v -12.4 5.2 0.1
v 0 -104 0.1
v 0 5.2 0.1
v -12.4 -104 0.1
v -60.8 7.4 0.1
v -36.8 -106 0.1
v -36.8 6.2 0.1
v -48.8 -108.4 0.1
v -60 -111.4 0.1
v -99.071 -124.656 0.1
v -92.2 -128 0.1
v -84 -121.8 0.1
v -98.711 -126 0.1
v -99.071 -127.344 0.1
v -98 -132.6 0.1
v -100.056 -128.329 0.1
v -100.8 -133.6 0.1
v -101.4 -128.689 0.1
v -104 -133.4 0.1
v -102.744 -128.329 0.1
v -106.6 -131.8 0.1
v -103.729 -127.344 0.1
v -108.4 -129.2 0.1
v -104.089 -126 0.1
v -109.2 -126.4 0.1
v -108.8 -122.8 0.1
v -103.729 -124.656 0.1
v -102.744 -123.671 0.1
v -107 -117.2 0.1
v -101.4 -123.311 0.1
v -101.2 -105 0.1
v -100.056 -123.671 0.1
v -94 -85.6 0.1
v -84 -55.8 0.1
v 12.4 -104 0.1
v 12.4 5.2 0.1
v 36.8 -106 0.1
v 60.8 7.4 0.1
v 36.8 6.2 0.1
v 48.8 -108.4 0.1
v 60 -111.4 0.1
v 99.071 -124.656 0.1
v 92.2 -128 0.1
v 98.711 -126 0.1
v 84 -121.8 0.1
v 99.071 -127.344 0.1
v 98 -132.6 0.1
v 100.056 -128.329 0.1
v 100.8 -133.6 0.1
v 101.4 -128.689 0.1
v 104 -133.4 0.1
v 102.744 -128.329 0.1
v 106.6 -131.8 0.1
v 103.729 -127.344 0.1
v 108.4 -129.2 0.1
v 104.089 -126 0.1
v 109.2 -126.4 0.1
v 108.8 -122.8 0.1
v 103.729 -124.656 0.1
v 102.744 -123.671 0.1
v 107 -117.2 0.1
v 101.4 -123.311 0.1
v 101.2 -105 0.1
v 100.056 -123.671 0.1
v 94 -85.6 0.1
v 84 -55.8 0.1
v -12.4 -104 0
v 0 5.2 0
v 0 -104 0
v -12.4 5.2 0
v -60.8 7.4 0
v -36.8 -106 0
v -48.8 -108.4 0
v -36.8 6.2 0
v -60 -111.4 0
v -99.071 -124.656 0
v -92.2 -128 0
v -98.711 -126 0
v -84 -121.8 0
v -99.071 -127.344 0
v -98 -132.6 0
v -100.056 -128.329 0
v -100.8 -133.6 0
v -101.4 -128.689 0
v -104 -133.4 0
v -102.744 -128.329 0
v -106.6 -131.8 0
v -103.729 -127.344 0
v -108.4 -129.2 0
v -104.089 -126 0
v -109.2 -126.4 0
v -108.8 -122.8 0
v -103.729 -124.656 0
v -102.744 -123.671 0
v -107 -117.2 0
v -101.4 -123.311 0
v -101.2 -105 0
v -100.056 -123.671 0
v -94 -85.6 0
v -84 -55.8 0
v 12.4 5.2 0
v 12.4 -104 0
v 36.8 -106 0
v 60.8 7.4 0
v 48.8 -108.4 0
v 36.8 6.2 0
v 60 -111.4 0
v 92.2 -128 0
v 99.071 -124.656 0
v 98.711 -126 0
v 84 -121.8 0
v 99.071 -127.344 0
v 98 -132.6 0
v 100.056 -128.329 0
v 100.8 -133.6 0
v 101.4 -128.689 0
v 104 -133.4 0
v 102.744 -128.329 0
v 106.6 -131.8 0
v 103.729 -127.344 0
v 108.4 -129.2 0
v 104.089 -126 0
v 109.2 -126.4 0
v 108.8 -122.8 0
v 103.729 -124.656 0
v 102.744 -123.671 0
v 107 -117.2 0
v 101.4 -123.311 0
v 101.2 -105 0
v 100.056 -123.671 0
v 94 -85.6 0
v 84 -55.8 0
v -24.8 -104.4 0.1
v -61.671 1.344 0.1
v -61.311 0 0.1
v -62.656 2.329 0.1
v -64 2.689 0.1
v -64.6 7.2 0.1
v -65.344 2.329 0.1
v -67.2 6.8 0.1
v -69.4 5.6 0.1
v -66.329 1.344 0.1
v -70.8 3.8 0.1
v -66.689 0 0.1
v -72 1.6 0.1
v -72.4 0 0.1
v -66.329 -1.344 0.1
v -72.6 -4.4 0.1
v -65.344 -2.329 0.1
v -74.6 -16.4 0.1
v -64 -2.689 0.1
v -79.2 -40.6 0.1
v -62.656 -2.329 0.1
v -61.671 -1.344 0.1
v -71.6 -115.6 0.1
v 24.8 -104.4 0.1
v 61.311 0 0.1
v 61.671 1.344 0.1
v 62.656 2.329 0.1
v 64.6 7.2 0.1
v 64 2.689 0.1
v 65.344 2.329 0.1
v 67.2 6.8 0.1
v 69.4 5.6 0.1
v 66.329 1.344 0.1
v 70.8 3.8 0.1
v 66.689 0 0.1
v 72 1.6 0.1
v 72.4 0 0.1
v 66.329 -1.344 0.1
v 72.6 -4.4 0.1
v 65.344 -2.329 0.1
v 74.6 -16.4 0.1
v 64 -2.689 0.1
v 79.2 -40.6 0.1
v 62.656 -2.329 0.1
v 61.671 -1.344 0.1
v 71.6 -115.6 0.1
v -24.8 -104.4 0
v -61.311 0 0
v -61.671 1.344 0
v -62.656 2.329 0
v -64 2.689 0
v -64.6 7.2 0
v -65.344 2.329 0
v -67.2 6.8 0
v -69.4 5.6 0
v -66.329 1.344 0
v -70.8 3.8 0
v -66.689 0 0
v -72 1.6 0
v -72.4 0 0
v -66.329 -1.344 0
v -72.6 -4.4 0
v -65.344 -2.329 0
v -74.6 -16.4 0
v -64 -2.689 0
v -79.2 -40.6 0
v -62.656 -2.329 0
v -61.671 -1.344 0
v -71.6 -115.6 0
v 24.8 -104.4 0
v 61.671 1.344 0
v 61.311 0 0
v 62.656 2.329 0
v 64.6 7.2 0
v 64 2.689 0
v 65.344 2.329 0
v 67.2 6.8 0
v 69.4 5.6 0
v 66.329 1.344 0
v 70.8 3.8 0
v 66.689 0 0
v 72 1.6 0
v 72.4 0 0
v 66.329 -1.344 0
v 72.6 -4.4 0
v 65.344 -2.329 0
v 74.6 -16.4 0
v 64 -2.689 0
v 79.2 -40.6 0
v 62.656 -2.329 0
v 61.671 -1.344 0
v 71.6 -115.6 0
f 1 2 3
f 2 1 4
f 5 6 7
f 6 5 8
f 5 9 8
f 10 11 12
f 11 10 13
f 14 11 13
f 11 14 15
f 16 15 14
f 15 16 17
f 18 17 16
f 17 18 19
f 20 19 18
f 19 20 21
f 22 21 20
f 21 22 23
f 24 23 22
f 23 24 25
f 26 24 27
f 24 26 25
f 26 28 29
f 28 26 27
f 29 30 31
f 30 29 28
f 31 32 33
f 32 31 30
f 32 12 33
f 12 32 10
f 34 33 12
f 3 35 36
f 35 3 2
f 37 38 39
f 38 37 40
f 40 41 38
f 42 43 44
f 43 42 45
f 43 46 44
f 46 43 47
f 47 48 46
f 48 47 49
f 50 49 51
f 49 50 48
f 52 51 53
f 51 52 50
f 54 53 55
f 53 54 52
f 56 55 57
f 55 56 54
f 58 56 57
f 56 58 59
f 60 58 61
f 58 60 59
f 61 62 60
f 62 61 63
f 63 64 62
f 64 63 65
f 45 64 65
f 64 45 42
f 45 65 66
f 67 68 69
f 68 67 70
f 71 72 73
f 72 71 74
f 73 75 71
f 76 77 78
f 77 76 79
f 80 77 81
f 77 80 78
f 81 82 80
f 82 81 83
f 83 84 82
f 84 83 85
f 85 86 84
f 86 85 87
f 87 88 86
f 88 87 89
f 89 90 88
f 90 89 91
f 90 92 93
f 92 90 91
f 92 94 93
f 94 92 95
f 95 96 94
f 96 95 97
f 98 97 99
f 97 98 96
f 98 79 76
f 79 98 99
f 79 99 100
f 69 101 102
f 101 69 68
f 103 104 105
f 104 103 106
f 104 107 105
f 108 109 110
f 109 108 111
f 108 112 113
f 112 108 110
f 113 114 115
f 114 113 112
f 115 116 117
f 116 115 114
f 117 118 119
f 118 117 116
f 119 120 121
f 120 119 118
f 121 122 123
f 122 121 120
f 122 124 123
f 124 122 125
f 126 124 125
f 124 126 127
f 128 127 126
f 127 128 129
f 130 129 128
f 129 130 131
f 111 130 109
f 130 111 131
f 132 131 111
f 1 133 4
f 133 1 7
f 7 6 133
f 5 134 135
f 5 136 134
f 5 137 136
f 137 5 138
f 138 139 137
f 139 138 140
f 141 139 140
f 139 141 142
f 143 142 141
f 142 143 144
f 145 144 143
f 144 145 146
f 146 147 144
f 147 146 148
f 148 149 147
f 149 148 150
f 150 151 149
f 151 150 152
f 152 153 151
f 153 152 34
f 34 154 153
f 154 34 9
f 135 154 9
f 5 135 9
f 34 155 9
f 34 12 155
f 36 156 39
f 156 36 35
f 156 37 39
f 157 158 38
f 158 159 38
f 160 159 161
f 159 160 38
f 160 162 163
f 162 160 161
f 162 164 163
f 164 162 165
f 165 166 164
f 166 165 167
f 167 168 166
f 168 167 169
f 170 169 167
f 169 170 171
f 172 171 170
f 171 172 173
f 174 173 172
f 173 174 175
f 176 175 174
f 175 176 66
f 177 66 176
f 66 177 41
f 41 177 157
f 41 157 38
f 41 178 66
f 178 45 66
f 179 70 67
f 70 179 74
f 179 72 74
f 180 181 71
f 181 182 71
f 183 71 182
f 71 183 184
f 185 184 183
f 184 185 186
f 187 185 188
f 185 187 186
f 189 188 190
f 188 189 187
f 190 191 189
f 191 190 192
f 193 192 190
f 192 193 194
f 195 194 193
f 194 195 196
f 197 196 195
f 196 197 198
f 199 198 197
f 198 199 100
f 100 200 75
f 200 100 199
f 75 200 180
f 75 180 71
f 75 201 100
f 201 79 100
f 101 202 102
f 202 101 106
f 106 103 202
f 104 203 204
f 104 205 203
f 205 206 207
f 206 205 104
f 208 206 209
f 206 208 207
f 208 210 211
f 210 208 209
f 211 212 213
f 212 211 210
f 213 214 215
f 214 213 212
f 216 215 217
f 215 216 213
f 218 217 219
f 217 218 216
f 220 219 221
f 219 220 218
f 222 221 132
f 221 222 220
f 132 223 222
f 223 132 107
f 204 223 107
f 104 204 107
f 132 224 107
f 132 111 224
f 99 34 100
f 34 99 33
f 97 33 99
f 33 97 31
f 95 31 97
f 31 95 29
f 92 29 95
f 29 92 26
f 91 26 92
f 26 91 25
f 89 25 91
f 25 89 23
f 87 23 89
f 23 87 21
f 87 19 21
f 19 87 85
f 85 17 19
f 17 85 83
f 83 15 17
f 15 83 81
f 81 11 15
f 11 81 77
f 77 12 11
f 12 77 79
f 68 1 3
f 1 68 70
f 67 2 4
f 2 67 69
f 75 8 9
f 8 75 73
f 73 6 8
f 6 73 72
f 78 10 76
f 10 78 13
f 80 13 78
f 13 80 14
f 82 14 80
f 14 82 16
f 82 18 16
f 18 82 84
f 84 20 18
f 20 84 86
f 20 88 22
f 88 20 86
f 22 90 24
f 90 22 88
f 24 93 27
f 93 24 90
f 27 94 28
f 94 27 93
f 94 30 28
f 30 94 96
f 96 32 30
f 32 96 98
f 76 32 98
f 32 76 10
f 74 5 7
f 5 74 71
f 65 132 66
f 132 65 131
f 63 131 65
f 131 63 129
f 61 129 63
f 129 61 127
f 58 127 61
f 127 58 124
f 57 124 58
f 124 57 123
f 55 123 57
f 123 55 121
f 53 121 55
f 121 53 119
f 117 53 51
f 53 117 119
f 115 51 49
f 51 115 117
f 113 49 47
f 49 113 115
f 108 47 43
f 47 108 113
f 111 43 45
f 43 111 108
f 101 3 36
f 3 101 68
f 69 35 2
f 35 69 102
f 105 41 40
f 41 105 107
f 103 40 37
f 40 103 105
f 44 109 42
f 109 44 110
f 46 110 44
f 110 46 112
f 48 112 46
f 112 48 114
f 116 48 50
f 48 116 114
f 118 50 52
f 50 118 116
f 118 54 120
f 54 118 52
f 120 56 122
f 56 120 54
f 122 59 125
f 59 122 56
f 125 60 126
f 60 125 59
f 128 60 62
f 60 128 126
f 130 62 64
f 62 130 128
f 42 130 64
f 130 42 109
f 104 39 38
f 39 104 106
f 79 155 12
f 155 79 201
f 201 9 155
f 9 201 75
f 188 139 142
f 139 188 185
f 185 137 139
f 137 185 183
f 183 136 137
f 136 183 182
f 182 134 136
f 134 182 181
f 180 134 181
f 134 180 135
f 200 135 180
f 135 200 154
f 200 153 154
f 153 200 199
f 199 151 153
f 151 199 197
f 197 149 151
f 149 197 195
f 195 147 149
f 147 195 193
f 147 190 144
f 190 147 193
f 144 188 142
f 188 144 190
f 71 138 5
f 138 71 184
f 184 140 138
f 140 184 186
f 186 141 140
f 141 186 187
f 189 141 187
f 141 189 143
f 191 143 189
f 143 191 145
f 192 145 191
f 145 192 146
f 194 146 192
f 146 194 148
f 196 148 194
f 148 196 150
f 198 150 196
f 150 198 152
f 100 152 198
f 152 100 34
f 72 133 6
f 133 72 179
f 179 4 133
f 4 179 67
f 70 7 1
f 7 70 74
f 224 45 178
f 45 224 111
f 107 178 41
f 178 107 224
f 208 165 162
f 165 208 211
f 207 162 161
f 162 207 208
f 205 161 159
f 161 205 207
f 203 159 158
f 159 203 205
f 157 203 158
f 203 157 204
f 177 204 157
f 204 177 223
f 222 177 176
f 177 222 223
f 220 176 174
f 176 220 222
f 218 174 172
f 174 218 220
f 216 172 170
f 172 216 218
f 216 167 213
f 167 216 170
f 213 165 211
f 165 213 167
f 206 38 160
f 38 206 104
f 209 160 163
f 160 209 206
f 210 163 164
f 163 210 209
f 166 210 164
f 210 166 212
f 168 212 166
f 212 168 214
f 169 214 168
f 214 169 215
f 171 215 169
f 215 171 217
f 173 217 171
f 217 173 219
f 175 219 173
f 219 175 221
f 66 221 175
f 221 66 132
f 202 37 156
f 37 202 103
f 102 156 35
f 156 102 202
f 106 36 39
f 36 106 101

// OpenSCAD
// file: ../p/rect2p.scad
use <../lib.scad>
function ldraw_lib__rect2p() = [
// 0 Rectangle with 2 Parallel Edges
// 0 Name: rect2p.dat
// 0 Author: Donald Sutter [technog]
// 0 !LDRAW_ORG Primitive UPDATE 2010-01
// 0 !LICENSE Licensed under CC BY 4.0 : see CAreadme.txt
// 
// 0 BFC CERTIFY CCW
  [0,"BFC","CERTIFY"],
  [0,"BFC","CCW"],
// 
// 0 !HISTORY 2003-08-01 [PTadmin] Official Update 2003-02
// 0 !HISTORY 2007-06-24 [PTadmin] Header formatted for Contributor Agreement
// 0 !HISTORY 2008-07-01 [PTadmin] Official Update 2008-01
// 0 !HISTORY 2010-01-17 [mikeheide] changed winding to CCW
// 0 !HISTORY 2010-04-05 [PTadmin] Official Update 2010-01
// 
// 
// 2 24 1 0 1 -1 0 1
  [2,24,1,0,1,-1,0,1],
// 2 24 -1 0 -1 1 0 -1
  [2,24,-1,0,-1,1,0,-1],
// 4 16 -1 0 1 -1 0 -1 1 0 -1 1 0 1
  [4,16,-1,0,1,-1,0,-1,1,0,-1,1,0,1],
// 0
];
module ldraw_lib__rect2p(step=0, col=false, unit=2/5, alt=false, line=0.2, solid=!$preview)
    makepoly(ldraw_lib__rect2p(), step=step, col=col, unit=unit, alt=alt, line=line, solid=solid);
ldraw_lib__rect2p(line=0.2);
// file: s/u9494s04.scad
use <../../lib.scad>
function ldraw_lib__s__u9494s04() = [
// 0 ~Sail 27 x 17 Trapezoidal Edge Stripe 2
// 0 Name: s\u9494s04.dat
// 0 Author: Philippe Hurbain [Philo]
// 0 !LDRAW_ORG Subpart UPDATE 2020-03
// 0 !LICENSE Licensed under CC BY 4.0 : see CAreadme.txt
// 
// 0 BFC CERTIFY CCW
  [0,"BFC","CERTIFY"],
  [0,"BFC","CCW"],
// 
// 0 !HISTORY 2020-12-29 [PTadmin] Official Update 2020-03
// 
// 
// 4 16 -210 0 -304.5 -179 0 -289 -179 -0.25 -289 -210 -0.25 -304.5
  [4,16,-210,0,-304.5,-179,0,-289,-179,-0.25,-289,-210,-0.25,-304.5],
// 4 16 -179 0 -289 -150 0 -278.5 -150 -0.25 -278.5 -179 -0.25 -289
  [4,16,-179,0,-289,-150,0,-278.5,-150,-0.25,-278.5,-179,-0.25,-289],
// 4 16 -165.8214 0 3.361 -163.361 0 5.8214 -163.361 -0.25 5.8214 -165.8214 -0.25 3.361
  [4,16,-165.8214,0,3.361,-163.361,0,5.8214,-163.361,-0.25,5.8214,-165.8214,-0.25,3.361],
// 4 16 -163.361 0 5.8214 -160 0 6.722 -160 -0.25 6.722 -163.361 -0.25 5.8214
  [4,16,-163.361,0,5.8214,-160,0,6.722,-160,-0.25,6.722,-163.361,-0.25,5.8214],
// 4 16 -160 0 6.722 -156.639 0 5.8214 -156.639 -0.25 5.8214 -160 -0.25 6.722
  [4,16,-160,0,6.722,-156.639,0,5.8214,-156.639,-0.25,5.8214,-160,-0.25,6.722],
// 4 16 -156.639 0 5.8214 -154.1786 0 3.361 -154.1786 -0.25 3.361 -156.639 -0.25 5.8214
  [4,16,-156.639,0,5.8214,-154.1786,0,3.361,-154.1786,-0.25,3.361,-156.639,-0.25,5.8214],
// 4 16 -154.1786 0 3.361 -153.278 0 0 -153.278 -0.25 0 -154.1786 -0.25 3.361
  [4,16,-154.1786,0,3.361,-153.278,0,0,-153.278,-0.25,0,-154.1786,-0.25,3.361],
// 4 16 -153.278 0 0 -154.1786 0 -3.361 -154.1786 -0.25 -3.361 -153.278 -0.25 0
  [4,16,-153.278,0,0,-154.1786,0,-3.361,-154.1786,-0.25,-3.361,-153.278,-0.25,0],
// 4 16 -154.1786 0 -3.361 -156.639 0 -5.8214 -156.639 -0.25 -5.8214 -154.1786 -0.25 -3.361
  [4,16,-154.1786,0,-3.361,-156.639,0,-5.8214,-156.639,-0.25,-5.8214,-154.1786,-0.25,-3.361],
// 4 16 -156.639 0 -5.8214 -160 0 -6.722 -160 -0.25 -6.722 -156.639 -0.25 -5.8214
  [4,16,-156.639,0,-5.8214,-160,0,-6.722,-160,-0.25,-6.722,-156.639,-0.25,-5.8214],
// 4 16 -160 0 -6.722 -163.361 0 -5.8214 -163.361 -0.25 -5.8214 -160 -0.25 -6.722
  [4,16,-160,0,-6.722,-163.361,0,-5.8214,-163.361,-0.25,-5.8214,-160,-0.25,-6.722],
// 4 16 -163.361 0 -5.8214 -165.8214 0 -3.361 -165.8214 -0.25 -3.361 -163.361 -0.25 -5.8214
  [4,16,-163.361,0,-5.8214,-165.8214,0,-3.361,-165.8214,-0.25,-3.361,-163.361,-0.25,-5.8214],
// 4 16 -165.8214 0 -3.361 -166.722 0 0 -166.722 -0.25 0 -165.8214 -0.25 -3.361
  [4,16,-165.8214,0,-3.361,-166.722,0,0,-166.722,-0.25,0,-165.8214,-0.25,-3.361],
// 4 16 -166.722 0 0 -165.8214 0 3.361 -165.8214 -0.25 3.361 -166.722 -0.25 0
  [4,16,-166.722,0,0,-165.8214,0,3.361,-165.8214,-0.25,3.361,-166.722,-0.25,0],
// 4 16 -152 0 18.5 -161.5 0 18 -161.5 -0.25 18 -152 -0.25 18.5
  [4,16,-152,0,18.5,-161.5,0,18,-161.5,-0.25,18,-152,-0.25,18.5],
// 4 16 -161.5 0 18 -168 0 17 -168 -0.25 17 -161.5 -0.25 18
  [4,16,-161.5,0,18,-168,0,17,-168,-0.25,17,-161.5,-0.25,18],
// 4 16 -168 0 17 -173.5 0 14 -173.5 -0.25 14 -168 -0.25 17
  [4,16,-168,0,17,-173.5,0,14,-173.5,-0.25,14,-168,-0.25,17],
// 4 16 -173.5 0 14 -177 0 9.5 -177 -0.25 9.5 -173.5 -0.25 14
  [4,16,-173.5,0,14,-177,0,9.5,-177,-0.25,9.5,-173.5,-0.25,14],
// 4 16 -177 0 9.5 -180 0 4 -180 -0.25 4 -177 -0.25 9.5
  [4,16,-177,0,9.5,-180,0,4,-180,-0.25,4,-177,-0.25,9.5],
// 4 16 -180 0 4 -181 0 0 -181 -0.25 0 -180 -0.25 4
  [4,16,-180,0,4,-181,0,0,-181,-0.25,0,-180,-0.25,4],
// 4 16 -181 0 0 -181.5 0 -11 -181.5 -0.25 -11 -181 -0.25 0
  [4,16,-181,0,0,-181.5,0,-11,-181.5,-0.25,-11,-181,-0.25,0],
// 4 16 -181.5 0 -11 -186.5 0 -41 -186.5 -0.25 -41 -181.5 -0.25 -11
  [4,16,-181.5,0,-11,-186.5,0,-41,-186.5,-0.25,-41,-181.5,-0.25,-11],
// 4 16 -186.5 0 -41 -198 0 -101.5 -198 -0.25 -101.5 -186.5 -0.25 -41
  [4,16,-186.5,0,-41,-198,0,-101.5,-198,-0.25,-101.5,-186.5,-0.25,-41],
// 4 16 -198 0 -101.5 -210 0 -139.5 -210 -0.25 -139.5 -198 -0.25 -101.5
  [4,16,-198,0,-101.5,-210,0,-139.5,-210,-0.25,-139.5,-198,-0.25,-101.5],
// 4 16 -92 0 -265 -62 0 -261 -62 -0.25 -261 -92 -0.25 -265
  [4,16,-92,0,-265,-62,0,-261,-62,-0.25,-261,-92,-0.25,-265],
// 4 16 -62 0 -261 -31 0 -260 -31 -0.25 -260 -62 -0.25 -261
  [4,16,-62,0,-261,-31,0,-260,-31,-0.25,-260,-62,-0.25,-261],
// 4 16 -31 0 13 -92 0 15.5 -92 -0.25 15.5 -31 -0.25 13
  [4,16,-31,0,13,-92,0,15.5,-92,-0.25,15.5,-31,-0.25,13],
// 5 24 -156.639 0 -5.8214 -156.639 -0.25 -5.8214 -160 0 -6.722 -154.1786 0 -3.361
  [5,24,-156.639,0,-5.8214,-156.639,-0.25,-5.8214,-160,0,-6.722,-154.1786,0,-3.361],
// 5 24 -160 0 -6.722 -160 -0.25 -6.722 -163.361 0 -5.8214 -156.639 0 -5.8214
  [5,24,-160,0,-6.722,-160,-0.25,-6.722,-163.361,0,-5.8214,-156.639,0,-5.8214],
// 5 24 -163.361 0 -5.8214 -163.361 -0.25 -5.8214 -165.8214 0 -3.361 -160 0 -6.722
  [5,24,-163.361,0,-5.8214,-163.361,-0.25,-5.8214,-165.8214,0,-3.361,-160,0,-6.722],
// 5 24 -165.8214 0 -3.361 -165.8214 -0.25 -3.361 -166.722 0 0 -163.361 0 -5.8214
  [5,24,-165.8214,0,-3.361,-165.8214,-0.25,-3.361,-166.722,0,0,-163.361,0,-5.8214],
// 5 24 -166.722 0 0 -166.722 -0.25 0 -165.8214 0 3.361 -165.8214 0 -3.361
  [5,24,-166.722,0,0,-166.722,-0.25,0,-165.8214,0,3.361,-165.8214,0,-3.361],
// 5 24 -165.8214 0 3.361 -165.8214 -0.25 3.361 -166.722 0 0 -163.361 0 5.8214
  [5,24,-165.8214,0,3.361,-165.8214,-0.25,3.361,-166.722,0,0,-163.361,0,5.8214],
// 5 24 -161.5 0 18 -161.5 -0.25 18 -168 0 17 -152 0 18.5
  [5,24,-161.5,0,18,-161.5,-0.25,18,-168,0,17,-152,0,18.5],
// 5 24 -168 0 17 -168 -0.25 17 -173.5 0 14 -161.5 0 18
  [5,24,-168,0,17,-168,-0.25,17,-173.5,0,14,-161.5,0,18],
// 5 24 -173.5 0 14 -173.5 -0.25 14 -177 0 9.5 -168 0 17
  [5,24,-173.5,0,14,-173.5,-0.25,14,-177,0,9.5,-168,0,17],
// 5 24 -177 0 9.5 -177 -0.25 9.5 -180 0 4 -173.5 0 14
  [5,24,-177,0,9.5,-177,-0.25,9.5,-180,0,4,-173.5,0,14],
// 5 24 -180 0 4 -180 -0.25 4 -181 0 0 -177 0 9.5
  [5,24,-180,0,4,-180,-0.25,4,-181,0,0,-177,0,9.5],
// 5 24 -181 0 0 -181 -0.25 0 -181.5 0 -11 -180 0 4
  [5,24,-181,0,0,-181,-0.25,0,-181.5,0,-11,-180,0,4],
// 5 24 -181.5 0 -11 -181.5 -0.25 -11 -186.5 0 -41 -181 0 0
  [5,24,-181.5,0,-11,-181.5,-0.25,-11,-186.5,0,-41,-181,0,0],
// 5 24 -186.5 0 -41 -186.5 -0.25 -41 -198 0 -101.5 -181.5 0 -11
  [5,24,-186.5,0,-41,-186.5,-0.25,-41,-198,0,-101.5,-181.5,0,-11],
// 5 24 -198 0 -101.5 -198 -0.25 -101.5 -210 0 -139.5 -186.5 0 -41
  [5,24,-198,0,-101.5,-198,-0.25,-101.5,-210,0,-139.5,-186.5,0,-41],
// 5 24 -62 0 -261 -62 -0.25 -261 -31 0 -260 -92 0 -265
  [5,24,-62,0,-261,-62,-0.25,-261,-31,0,-260,-92,0,-265],
// 5 24 -179 0 -289 -179 -0.25 -289 -150 0 -278.5 -210 0 -304.5
  [5,24,-179,0,-289,-179,-0.25,-289,-150,0,-278.5,-210,0,-304.5],
// 5 24 -163.361 0 5.8214 -163.361 -0.25 5.8214 -160 0 6.722 -165.8214 0 3.361
  [5,24,-163.361,0,5.8214,-163.361,-0.25,5.8214,-160,0,6.722,-165.8214,0,3.361],
// 5 24 -160 0 6.722 -160 -0.25 6.722 -156.639 0 5.8214 -163.361 0 5.8214
  [5,24,-160,0,6.722,-160,-0.25,6.722,-156.639,0,5.8214,-163.361,0,5.8214],
// 5 24 -156.639 0 5.8214 -156.639 -0.25 5.8214 -154.1786 0 3.361 -160 0 6.722
  [5,24,-156.639,0,5.8214,-156.639,-0.25,5.8214,-154.1786,0,3.361,-160,0,6.722],
// 5 24 -154.1786 0 3.361 -154.1786 -0.25 3.361 -153.278 0 0 -156.639 0 5.8214
  [5,24,-154.1786,0,3.361,-154.1786,-0.25,3.361,-153.278,0,0,-156.639,0,5.8214],
// 5 24 -153.278 0 0 -153.278 -0.25 0 -154.1786 0 -3.361 -154.1786 0 3.361
  [5,24,-153.278,0,0,-153.278,-0.25,0,-154.1786,0,-3.361,-154.1786,0,3.361],
// 5 24 -154.1786 0 -3.361 -154.1786 -0.25 -3.361 -156.639 0 -5.8214 -153.278 0 0
  [5,24,-154.1786,0,-3.361,-154.1786,-0.25,-3.361,-156.639,0,-5.8214,-153.278,0,0],
];
module ldraw_lib__s__u9494s04(step=0, col=false, unit=2/5, alt=false, line=0.2, solid=!$preview)
    makepoly(ldraw_lib__s__u9494s04(), step=step, col=col, unit=unit, alt=alt, line=line, solid=solid);
ldraw_lib__s__u9494s04(line=0.2);
// file: s/u9494s02.scad
use <../../lib.scad>
function ldraw_lib__s__u9494s02() = [
// 0 ~Sail 27 x 17 Trapezoidal Surface Stripe  2
// 0 Name: s\u9494s02.dat
// 0 Author: Philippe Hurbain [Philo]
// 0 !LDRAW_ORG Subpart UPDATE 2020-03
// 0 !LICENSE Licensed under CC BY 4.0 : see CAreadme.txt
// 
// 0 BFC CERTIFY CCW
  [0,"BFC","CERTIFY"],
  [0,"BFC","CCW"],
// 
// 0 !HISTORY 2020-12-29 [PTadmin] Official Update 2020-03
// 
// 
// 4 16 -62 0 -261 -31 0 -260 -31 0 13 -92 0 15.5
  [4,16,-62,0,-261,-31,0,-260,-31,0,13,-92,0,15.5],
// 3 16 -92 0 15.5 -92 0 -265 -62 0 -261
  [3,16,-92,0,15.5,-92,0,-265,-62,0,-261],
// 3 16 -152 0 18.5 -154.1786 0 3.361 -153.278 0 0
  [3,16,-152,0,18.5,-154.1786,0,3.361,-153.278,0,0],
// 3 16 -152 0 18.5 -156.639 0 5.8214 -154.1786 0 3.361
  [3,16,-152,0,18.5,-156.639,0,5.8214,-154.1786,0,3.361],
// 4 16 -160 0 6.722 -156.639 0 5.8214 -152 0 18.5 -161.5 0 18
  [4,16,-160,0,6.722,-156.639,0,5.8214,-152,0,18.5,-161.5,0,18],
// 4 16 -163.361 0 5.8214 -160 0 6.722 -161.5 0 18 -168 0 17
  [4,16,-163.361,0,5.8214,-160,0,6.722,-161.5,0,18,-168,0,17],
// 4 16 -163.361 0 5.8214 -168 0 17 -173.5 0 14 -165.8214 0 3.361
  [4,16,-163.361,0,5.8214,-168,0,17,-173.5,0,14,-165.8214,0,3.361],
// 4 16 -165.8214 0 3.361 -173.5 0 14 -177 0 9.5 -166.722 0 0
  [4,16,-165.8214,0,3.361,-173.5,0,14,-177,0,9.5,-166.722,0,0],
// 4 16 -166.722 0 0 -177 0 9.5 -180 0 4 -181 0 0
  [4,16,-166.722,0,0,-177,0,9.5,-180,0,4,-181,0,0],
// 4 16 -165.8214 0 -3.361 -166.722 0 0 -181 0 0 -181.5 0 -11
  [4,16,-165.8214,0,-3.361,-166.722,0,0,-181,0,0,-181.5,0,-11],
// 4 16 -163.361 0 -5.8214 -165.8214 0 -3.361 -181.5 0 -11 -186.5 0 -41
  [4,16,-163.361,0,-5.8214,-165.8214,0,-3.361,-181.5,0,-11,-186.5,0,-41],
// 4 16 -160 0 -6.722 -163.361 0 -5.8214 -186.5 0 -41 -198 0 -101.5
  [4,16,-160,0,-6.722,-163.361,0,-5.8214,-186.5,0,-41,-198,0,-101.5],
// 4 16 -156.639 0 -5.8214 -160 0 -6.722 -198 0 -101.5 -210 0 -139.5
  [4,16,-156.639,0,-5.8214,-160,0,-6.722,-198,0,-101.5,-210,0,-139.5],
// 4 16 -156.639 0 -5.8214 -210 0 -139.5 -150 0 -278.5 -154.1786 0 -3.361
  [4,16,-156.639,0,-5.8214,-210,0,-139.5,-150,0,-278.5,-154.1786,0,-3.361],
// 3 16 -153.278 0 0 -154.1786 0 -3.361 -150 0 -278.5
  [3,16,-153.278,0,0,-154.1786,0,-3.361,-150,0,-278.5],
// 3 16 -152 0 18.5 -153.278 0 0 -150 0 -278.5
  [3,16,-152,0,18.5,-153.278,0,0,-150,0,-278.5],
// 3 16 -210 0 -139.5 -179 0 -289 -150 0 -278.5
  [3,16,-210,0,-139.5,-179,0,-289,-150,0,-278.5],
// 3 16 -210 0 -139.5 -210 0 -304.5 -179 0 -289
  [3,16,-210,0,-139.5,-210,0,-304.5,-179,0,-289],
// 2 24 -210 0 -304.5 -179 0 -289
  [2,24,-210,0,-304.5,-179,0,-289],
// 2 24 -166.722 0 0 -165.8214 0 3.361
  [2,24,-166.722,0,0,-165.8214,0,3.361],
// 2 24 -168 0 17 -173.5 0 14
  [2,24,-168,0,17,-173.5,0,14],
// 2 24 -62 0 -261 -31 0 -260
  [2,24,-62,0,-261,-31,0,-260],
// 2 24 -181.5 0 -11 -186.5 0 -41
  [2,24,-181.5,0,-11,-186.5,0,-41],
// 2 24 -161.5 0 18 -168 0 17
  [2,24,-161.5,0,18,-168,0,17],
// 2 24 -152 0 18.5 -161.5 0 18
  [2,24,-152,0,18.5,-161.5,0,18],
// 2 24 -160 0 -6.722 -163.361 0 -5.8214
  [2,24,-160,0,-6.722,-163.361,0,-5.8214],
// 2 24 -163.361 0 -5.8214 -165.8214 0 -3.361
  [2,24,-163.361,0,-5.8214,-165.8214,0,-3.361],
// 2 24 -31 0 13 -92 0 15.5
  [2,24,-31,0,13,-92,0,15.5],
// 2 24 -156.639 0 -5.8214 -160 0 -6.722
  [2,24,-156.639,0,-5.8214,-160,0,-6.722],
// 2 24 -153.278 0 0 -154.1786 0 -3.361
  [2,24,-153.278,0,0,-154.1786,0,-3.361],
// 2 24 -163.361 0 5.8214 -160 0 6.722
  [2,24,-163.361,0,5.8214,-160,0,6.722],
// 2 24 -186.5 0 -41 -198 0 -101.5
  [2,24,-186.5,0,-41,-198,0,-101.5],
// 2 24 -198 0 -101.5 -210 0 -139.5
  [2,24,-198,0,-101.5,-210,0,-139.5],
// 2 24 -177 0 9.5 -180 0 4
  [2,24,-177,0,9.5,-180,0,4],
// 2 24 -165.8214 0 -3.361 -166.722 0 0
  [2,24,-165.8214,0,-3.361,-166.722,0,0],
// 2 24 -154.1786 0 -3.361 -156.639 0 -5.8214
  [2,24,-154.1786,0,-3.361,-156.639,0,-5.8214],
// 2 24 -173.5 0 14 -177 0 9.5
  [2,24,-173.5,0,14,-177,0,9.5],
// 2 24 -180 0 4 -181 0 0
  [2,24,-180,0,4,-181,0,0],
// 2 24 -181 0 0 -181.5 0 -11
  [2,24,-181,0,0,-181.5,0,-11],
// 2 24 -154.1786 0 3.361 -153.278 0 0
  [2,24,-154.1786,0,3.361,-153.278,0,0],
// 2 24 -92 0 -265 -62 0 -261
  [2,24,-92,0,-265,-62,0,-261],
// 2 24 -156.639 0 5.8214 -154.1786 0 3.361
  [2,24,-156.639,0,5.8214,-154.1786,0,3.361],
// 2 24 -160 0 6.722 -156.639 0 5.8214
  [2,24,-160,0,6.722,-156.639,0,5.8214],
// 2 24 -165.8214 0 3.361 -163.361 0 5.8214
  [2,24,-165.8214,0,3.361,-163.361,0,5.8214],
// 2 24 -179 0 -289 -150 0 -278.5
  [2,24,-179,0,-289,-150,0,-278.5],
];
module ldraw_lib__s__u9494s02(step=0, col=false, unit=2/5, alt=false, line=0.2, solid=!$preview)
    makepoly(ldraw_lib__s__u9494s02(), step=step, col=col, unit=unit, alt=alt, line=line, solid=solid);
ldraw_lib__s__u9494s02(line=0.2);
// file: s/u9494s01.scad
use <../../lib.scad>
use <../../p/rect2p.scad>
function ldraw_lib__s__u9494s01() = [
// 0 ~Sail 27 x 17 Trapezoidal Surface Stripe 1
// 0 Name: s\u9494s01.dat
// 0 Author: Philippe Hurbain [Philo]
// 0 !LDRAW_ORG Subpart UPDATE 2020-03
// 0 !LICENSE Licensed under CC BY 4.0 : see CAreadme.txt
// 
// 0 BFC CERTIFY CCW
  [0,"BFC","CERTIFY"],
  [0,"BFC","CCW"],
// 
// 0 !HISTORY 2020-12-29 [PTadmin] Official Update 2020-03
// 
// 
// 1 16 -15.5 0 -123.5 -15.5 0 0 0 1 0 0 0 -136.5 rect2p.dat
  [1,16,-15.5,0,-123.5,-15.5,0,0,0,1,0,0,0,-136.5, ldraw_lib__rect2p()],
// 4 16 -122 0 -271 -92 0 -265 -92 0 15.5 -152 0 18.5
  [4,16,-122,0,-271,-92,0,-265,-92,0,15.5,-152,0,18.5],
// 3 16 -152 0 18.5 -150 0 -278.5 -122 0 -271
  [3,16,-152,0,18.5,-150,0,-278.5,-122,0,-271],
// 4 16 -210 0 -304.5 -247.6786 0 -311.639 -246.778 0 -315 -230.5 0 -320
  [4,16,-210,0,-304.5,-247.6786,0,-311.639,-246.778,0,-315,-230.5,0,-320],
// 4 16 -230.5 0 -320 -246.778 0 -315 -247.6786 0 -318.361 -245 0 -331.5
  [4,16,-230.5,0,-320,-246.778,0,-315,-247.6786,0,-318.361,-245,0,-331.5],
// 4 16 -245 0 -331.5 -247.6786 0 -318.361 -250.139 0 -320.8214 -252 0 -334
  [4,16,-245,0,-331.5,-247.6786,0,-318.361,-250.139,0,-320.8214,-252,0,-334],
// 4 16 -252 0 -334 -250.139 0 -320.8214 -253.5 0 -321.722 -260 0 -333.5
  [4,16,-252,0,-334,-250.139,0,-320.8214,-253.5,0,-321.722,-260,0,-333.5],
// 4 16 -260 0 -333.5 -253.5 0 -321.722 -256.861 0 -320.8214 -266.5 0 -329.5
  [4,16,-260,0,-333.5,-253.5,0,-321.722,-256.861,0,-320.8214,-266.5,0,-329.5],
// 4 16 -266.5 0 -329.5 -256.861 0 -320.8214 -259.3214 0 -318.361 -271 0 -323
  [4,16,-266.5,0,-329.5,-256.861,0,-320.8214,-259.3214,0,-318.361,-271,0,-323],
// 4 16 -271 0 -323 -259.3214 0 -318.361 -260.222 0 -315 -273 0 -316
  [4,16,-271,0,-323,-259.3214,0,-318.361,-260.222,0,-315,-273,0,-316],
// 4 16 -273 0 -316 -260.222 0 -315 -259.3214 0 -311.639 -272 0 -307
  [4,16,-273,0,-316,-260.222,0,-315,-259.3214,0,-311.639,-272,0,-307],
// 4 16 -272 0 -307 -259.3214 0 -311.639 -256.861 0 -309.1786 -267.5 0 -293
  [4,16,-272,0,-307,-259.3214,0,-311.639,-256.861,0,-309.1786,-267.5,0,-293],
// 4 16 -267.5 0 -293 -256.861 0 -309.1786 -253.5 0 -308.278 -253 0 -262.5
  [4,16,-267.5,0,-293,-256.861,0,-309.1786,-253.5,0,-308.278,-253,0,-262.5],
// 4 16 -253 0 -262.5 -253.5 0 -308.278 -250.139 0 -309.1786 -235 0 -214
  [4,16,-253,0,-262.5,-253.5,0,-308.278,-250.139,0,-309.1786,-235,0,-214],
// 4 16 -210 0 -304.5 -235 0 -214 -250.139 0 -309.1786 -247.6786 0 -311.639
  [4,16,-210,0,-304.5,-235,0,-214,-250.139,0,-309.1786,-247.6786,0,-311.639],
// 3 16 -210 0 -139.5 -235 0 -214 -210 0 -304.5
  [3,16,-210,0,-139.5,-235,0,-214,-210,0,-304.5],
// 2 24 -266.5 0 -329.5 -260 0 -333.5
  [2,24,-266.5,0,-329.5,-260,0,-333.5],
// 2 24 -271 0 -323 -266.5 0 -329.5
  [2,24,-271,0,-323,-266.5,0,-329.5],
// 2 24 -260.222 0 -315 -259.3214 0 -311.639
  [2,24,-260.222,0,-315,-259.3214,0,-311.639],
// 2 24 -245 0 -331.5 -230.5 0 -320
  [2,24,-245,0,-331.5,-230.5,0,-320],
// 2 24 -272 0 -307 -273 0 -316
  [2,24,-272,0,-307,-273,0,-316],
// 2 24 -150 0 -278.5 -122 0 -271
  [2,24,-150,0,-278.5,-122,0,-271],
// 2 24 -235 0 -214 -253 0 -262.5
  [2,24,-235,0,-214,-253,0,-262.5],
// 2 24 -250.139 0 -309.1786 -247.6786 0 -311.639
  [2,24,-250.139,0,-309.1786,-247.6786,0,-311.639],
// 2 24 -260 0 -333.5 -252 0 -334
  [2,24,-260,0,-333.5,-252,0,-334],
// 2 24 -122 0 -271 -92 0 -265
  [2,24,-122,0,-271,-92,0,-265],
// 2 24 -230.5 0 -320 -210 0 -304.5
  [2,24,-230.5,0,-320,-210,0,-304.5],
// 2 24 -92 0 15.5 -152 0 18.5
  [2,24,-92,0,15.5,-152,0,18.5],
// 2 24 -259.3214 0 -318.361 -260.222 0 -315
  [2,24,-259.3214,0,-318.361,-260.222,0,-315],
// 2 24 -253.5 0 -321.722 -256.861 0 -320.8214
  [2,24,-253.5,0,-321.722,-256.861,0,-320.8214],
// 2 24 -247.6786 0 -311.639 -246.778 0 -315
  [2,24,-247.6786,0,-311.639,-246.778,0,-315],
// 2 24 -253.5 0 -308.278 -250.139 0 -309.1786
  [2,24,-253.5,0,-308.278,-250.139,0,-309.1786],
// 2 24 -250.139 0 -320.8214 -253.5 0 -321.722
  [2,24,-250.139,0,-320.8214,-253.5,0,-321.722],
// 2 24 -256.861 0 -320.8214 -259.3214 0 -318.361
  [2,24,-256.861,0,-320.8214,-259.3214,0,-318.361],
// 2 24 -259.3214 0 -311.639 -256.861 0 -309.1786
  [2,24,-259.3214,0,-311.639,-256.861,0,-309.1786],
// 2 24 -267.5 0 -293 -272 0 -307
  [2,24,-267.5,0,-293,-272,0,-307],
// 2 24 -256.861 0 -309.1786 -253.5 0 -308.278
  [2,24,-256.861,0,-309.1786,-253.5,0,-308.278],
// 2 24 -210 0 -139.5 -235 0 -214
  [2,24,-210,0,-139.5,-235,0,-214],
// 2 24 -252 0 -334 -245 0 -331.5
  [2,24,-252,0,-334,-245,0,-331.5],
// 2 24 -247.6786 0 -318.361 -250.139 0 -320.8214
  [2,24,-247.6786,0,-318.361,-250.139,0,-320.8214],
// 2 24 -273 0 -316 -271 0 -323
  [2,24,-273,0,-316,-271,0,-323],
// 2 24 -246.778 0 -315 -247.6786 0 -318.361
  [2,24,-246.778,0,-315,-247.6786,0,-318.361],
// 2 24 -253 0 -262.5 -267.5 0 -293
  [2,24,-253,0,-262.5,-267.5,0,-293],
];
module ldraw_lib__s__u9494s01(step=0, col=false, unit=2/5, alt=false, line=0.2, solid=!$preview)
    makepoly(ldraw_lib__s__u9494s01(), step=step, col=col, unit=unit, alt=alt, line=line, solid=solid);
ldraw_lib__s__u9494s01(line=0.2);
// main file
use <../lib.scad>
use <s/u9494s01.scad>
use <s/u9494s02.scad>
use <s/u9494s03.scad>
use <s/u9494s04.scad>
function ldraw_lib__u9494p01() = [
// 0 Sail 27 x 17 Trapezoidal with Thick Stripes on White Background Pattern
// 0 Name: u9494p01.dat
// 0 Author: Philippe Hurbain [Philo]
// 0 !LDRAW_ORG Part UPDATE 2020-03
// 0 !LICENSE Licensed under CC BY 4.0 : see CAreadme.txt
// 
// 0 BFC CERTIFY CCW
  [0,"BFC","CERTIFY"],
  [0,"BFC","CCW"],
// 
// 0 !CATEGORY Sheet Fabric
// 0 !KEYWORDS Black Seas Barracuda, Caribbean Clipper, set 10040, Set 6274
// 0 !KEYWORDS set 6285, set 6286, Skull's Eye Schooner
// 
// 0 !HISTORY 2020-12-29 [PTadmin] Official Update 2020-03
// 
// 
// 1 16 0 -0.25 0 1 0 0 0 1 0 0 0 1 s\u9494s01.dat
  [1,16,0,-0.25,0,1,0,0,0,1,0,0,0,1, ldraw_lib__s__u9494s01()],
// 1 16 0 -0.25 0 -1 0 0 0 1 0 0 0 1 s\u9494s01.dat
  [1,16,0,-0.25,0,-1,0,0,0,1,0,0,0,1, ldraw_lib__s__u9494s01()],
// 1 16 0 0 0 1 0 0 0 -1 0 0 0 1 s\u9494s01.dat
  [1,16,0,0,0,1,0,0,0,-1,0,0,0,1, ldraw_lib__s__u9494s01()],
// 1 16 0 0 0 -1 0 0 0 -1 0 0 0 1 s\u9494s01.dat
  [1,16,0,0,0,-1,0,0,0,-1,0,0,0,1, ldraw_lib__s__u9494s01()],
// 
// 1 15 0 -0.25 0 1 0 0 0 1 0 0 0 1 s\u9494s02.dat
  [1,15,0,-0.25,0,1,0,0,0,1,0,0,0,1, ldraw_lib__s__u9494s02()],
// 1 15 0 -0.25 0 -1 0 0 0 1 0 0 0 1 s\u9494s02.dat
  [1,15,0,-0.25,0,-1,0,0,0,1,0,0,0,1, ldraw_lib__s__u9494s02()],
// 1 15 0 0 0 1 0 0 0 -1 0 0 0 1 s\u9494s02.dat
  [1,15,0,0,0,1,0,0,0,-1,0,0,0,1, ldraw_lib__s__u9494s02()],
// 1 15 0 0 0 -1 0 0 0 -1 0 0 0 1 s\u9494s02.dat
  [1,15,0,0,0,-1,0,0,0,-1,0,0,0,1, ldraw_lib__s__u9494s02()],
// 
// 1 16 0 0 0 1 0 0 0 1 0 0 0 1 s\u9494s03.dat
  [1,16,0,0,0,1,0,0,0,1,0,0,0,1, ldraw_lib__s__u9494s03()],
// 1 16 0 0 0 -1 0 0 0 1 0 0 0 1 s\u9494s03.dat
  [1,16,0,0,0,-1,0,0,0,1,0,0,0,1, ldraw_lib__s__u9494s03()],
// 
// 1 15 0 0 0 1 0 0 0 1 0 0 0 1 s\u9494s04.dat
  [1,15,0,0,0,1,0,0,0,1,0,0,0,1, ldraw_lib__s__u9494s04()],
// 1 15 0 0 0 -1 0 0 0 1 0 0 0 1 s\u9494s04.dat
  [1,15,0,0,0,-1,0,0,0,1,0,0,0,1, ldraw_lib__s__u9494s04()],
];
module ldraw_lib__u9494p01(step=0, col=false, unit=2/5, alt=false, line=0.2, solid=!$preview)
    makepoly(ldraw_lib__u9494p01(), step=step, col=col, unit=unit, alt=alt, line=line, solid=solid);
ldraw_lib__u9494p01(line=0.2);
